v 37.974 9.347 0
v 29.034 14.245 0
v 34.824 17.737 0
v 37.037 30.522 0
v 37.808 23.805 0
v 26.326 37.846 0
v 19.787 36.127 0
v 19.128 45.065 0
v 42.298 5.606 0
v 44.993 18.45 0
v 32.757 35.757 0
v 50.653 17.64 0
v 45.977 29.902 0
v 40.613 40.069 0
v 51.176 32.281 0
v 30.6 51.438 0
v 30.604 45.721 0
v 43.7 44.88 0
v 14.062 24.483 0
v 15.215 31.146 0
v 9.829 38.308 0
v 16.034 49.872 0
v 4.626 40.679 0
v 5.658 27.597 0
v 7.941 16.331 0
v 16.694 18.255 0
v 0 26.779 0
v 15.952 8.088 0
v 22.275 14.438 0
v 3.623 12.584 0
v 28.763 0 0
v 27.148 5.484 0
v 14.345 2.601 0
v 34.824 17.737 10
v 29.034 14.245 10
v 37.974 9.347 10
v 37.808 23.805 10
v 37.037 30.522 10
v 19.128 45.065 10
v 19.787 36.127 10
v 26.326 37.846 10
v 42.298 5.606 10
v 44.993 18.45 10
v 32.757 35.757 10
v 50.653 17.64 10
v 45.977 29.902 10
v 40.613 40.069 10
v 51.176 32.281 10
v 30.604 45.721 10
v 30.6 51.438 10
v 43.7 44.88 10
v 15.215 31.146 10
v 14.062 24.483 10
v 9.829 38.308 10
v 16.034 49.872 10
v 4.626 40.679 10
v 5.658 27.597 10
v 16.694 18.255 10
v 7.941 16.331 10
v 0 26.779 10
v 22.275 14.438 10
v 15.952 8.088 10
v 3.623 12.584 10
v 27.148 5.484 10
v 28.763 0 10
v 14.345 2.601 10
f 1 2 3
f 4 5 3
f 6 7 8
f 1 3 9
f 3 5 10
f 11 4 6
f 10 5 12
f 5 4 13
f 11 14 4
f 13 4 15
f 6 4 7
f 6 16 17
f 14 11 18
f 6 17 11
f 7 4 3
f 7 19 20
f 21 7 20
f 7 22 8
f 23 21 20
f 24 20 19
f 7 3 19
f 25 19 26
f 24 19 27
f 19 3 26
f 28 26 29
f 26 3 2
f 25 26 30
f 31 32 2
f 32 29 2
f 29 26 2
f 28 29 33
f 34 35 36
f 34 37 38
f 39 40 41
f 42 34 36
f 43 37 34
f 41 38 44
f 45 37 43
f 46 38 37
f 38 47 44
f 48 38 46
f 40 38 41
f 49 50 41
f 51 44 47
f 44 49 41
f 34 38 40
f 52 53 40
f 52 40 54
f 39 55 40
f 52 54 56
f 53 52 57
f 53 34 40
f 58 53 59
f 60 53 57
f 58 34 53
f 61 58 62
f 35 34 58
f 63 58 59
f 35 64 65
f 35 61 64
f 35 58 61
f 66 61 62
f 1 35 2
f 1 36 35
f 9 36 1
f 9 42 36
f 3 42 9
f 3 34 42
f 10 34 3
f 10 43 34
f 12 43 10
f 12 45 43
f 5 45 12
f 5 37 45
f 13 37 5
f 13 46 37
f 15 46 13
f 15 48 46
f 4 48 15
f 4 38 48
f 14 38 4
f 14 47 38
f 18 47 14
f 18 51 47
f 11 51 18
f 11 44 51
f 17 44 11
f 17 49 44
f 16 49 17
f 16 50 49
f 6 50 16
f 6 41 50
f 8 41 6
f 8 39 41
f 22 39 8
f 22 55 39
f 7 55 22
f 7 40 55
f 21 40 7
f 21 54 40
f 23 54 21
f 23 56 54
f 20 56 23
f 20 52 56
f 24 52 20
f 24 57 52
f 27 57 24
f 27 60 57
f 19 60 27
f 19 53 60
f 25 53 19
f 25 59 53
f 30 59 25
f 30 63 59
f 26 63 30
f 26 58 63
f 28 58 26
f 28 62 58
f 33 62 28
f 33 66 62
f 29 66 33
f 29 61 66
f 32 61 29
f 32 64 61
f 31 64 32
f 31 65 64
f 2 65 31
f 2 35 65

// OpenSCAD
$fn = 32;

// ----------------------------------------------------------------------
// Fan rotor section: 11 blades, 12 mm hub radius, 14 mm blades
// ----------------------------------------------------------------------

// --- parameters (mm) ---
profile_height = 10;      // extrusion height
profile_points = 33;      // points of the closed outline

profile = [[37.808, 23.805], [45.977, 29.902], [51.176, 32.281], [37.037, 30.522], [40.613, 40.069], [43.7, 44.88], [32.757, 35.757], [30.604, 45.721], [30.6, 51.438], [26.326, 37.846], [19.128, 45.065], [16.034, 49.872], [19.787, 36.127], [9.829, 38.308], [4.626, 40.679], [15.215, 31.146], [5.658, 27.597], [0, 26.779], [14.062, 24.483], [7.941, 16.331], [3.623, 12.584], [16.694, 18.255], [15.952, 8.088], [14.345, 2.601], [22.275, 14.438], [27.148, 5.484], [28.763, 0], [29.034, 14.245], [37.974, 9.347], [42.298, 5.606], [34.824, 17.737], [44.993, 18.45], [50.653, 17.64]];  // single closed polygon, 33 points, counter clockwise

// --- the one profile operation ---
linear_extrude(height = profile_height) polygon(points = profile);
